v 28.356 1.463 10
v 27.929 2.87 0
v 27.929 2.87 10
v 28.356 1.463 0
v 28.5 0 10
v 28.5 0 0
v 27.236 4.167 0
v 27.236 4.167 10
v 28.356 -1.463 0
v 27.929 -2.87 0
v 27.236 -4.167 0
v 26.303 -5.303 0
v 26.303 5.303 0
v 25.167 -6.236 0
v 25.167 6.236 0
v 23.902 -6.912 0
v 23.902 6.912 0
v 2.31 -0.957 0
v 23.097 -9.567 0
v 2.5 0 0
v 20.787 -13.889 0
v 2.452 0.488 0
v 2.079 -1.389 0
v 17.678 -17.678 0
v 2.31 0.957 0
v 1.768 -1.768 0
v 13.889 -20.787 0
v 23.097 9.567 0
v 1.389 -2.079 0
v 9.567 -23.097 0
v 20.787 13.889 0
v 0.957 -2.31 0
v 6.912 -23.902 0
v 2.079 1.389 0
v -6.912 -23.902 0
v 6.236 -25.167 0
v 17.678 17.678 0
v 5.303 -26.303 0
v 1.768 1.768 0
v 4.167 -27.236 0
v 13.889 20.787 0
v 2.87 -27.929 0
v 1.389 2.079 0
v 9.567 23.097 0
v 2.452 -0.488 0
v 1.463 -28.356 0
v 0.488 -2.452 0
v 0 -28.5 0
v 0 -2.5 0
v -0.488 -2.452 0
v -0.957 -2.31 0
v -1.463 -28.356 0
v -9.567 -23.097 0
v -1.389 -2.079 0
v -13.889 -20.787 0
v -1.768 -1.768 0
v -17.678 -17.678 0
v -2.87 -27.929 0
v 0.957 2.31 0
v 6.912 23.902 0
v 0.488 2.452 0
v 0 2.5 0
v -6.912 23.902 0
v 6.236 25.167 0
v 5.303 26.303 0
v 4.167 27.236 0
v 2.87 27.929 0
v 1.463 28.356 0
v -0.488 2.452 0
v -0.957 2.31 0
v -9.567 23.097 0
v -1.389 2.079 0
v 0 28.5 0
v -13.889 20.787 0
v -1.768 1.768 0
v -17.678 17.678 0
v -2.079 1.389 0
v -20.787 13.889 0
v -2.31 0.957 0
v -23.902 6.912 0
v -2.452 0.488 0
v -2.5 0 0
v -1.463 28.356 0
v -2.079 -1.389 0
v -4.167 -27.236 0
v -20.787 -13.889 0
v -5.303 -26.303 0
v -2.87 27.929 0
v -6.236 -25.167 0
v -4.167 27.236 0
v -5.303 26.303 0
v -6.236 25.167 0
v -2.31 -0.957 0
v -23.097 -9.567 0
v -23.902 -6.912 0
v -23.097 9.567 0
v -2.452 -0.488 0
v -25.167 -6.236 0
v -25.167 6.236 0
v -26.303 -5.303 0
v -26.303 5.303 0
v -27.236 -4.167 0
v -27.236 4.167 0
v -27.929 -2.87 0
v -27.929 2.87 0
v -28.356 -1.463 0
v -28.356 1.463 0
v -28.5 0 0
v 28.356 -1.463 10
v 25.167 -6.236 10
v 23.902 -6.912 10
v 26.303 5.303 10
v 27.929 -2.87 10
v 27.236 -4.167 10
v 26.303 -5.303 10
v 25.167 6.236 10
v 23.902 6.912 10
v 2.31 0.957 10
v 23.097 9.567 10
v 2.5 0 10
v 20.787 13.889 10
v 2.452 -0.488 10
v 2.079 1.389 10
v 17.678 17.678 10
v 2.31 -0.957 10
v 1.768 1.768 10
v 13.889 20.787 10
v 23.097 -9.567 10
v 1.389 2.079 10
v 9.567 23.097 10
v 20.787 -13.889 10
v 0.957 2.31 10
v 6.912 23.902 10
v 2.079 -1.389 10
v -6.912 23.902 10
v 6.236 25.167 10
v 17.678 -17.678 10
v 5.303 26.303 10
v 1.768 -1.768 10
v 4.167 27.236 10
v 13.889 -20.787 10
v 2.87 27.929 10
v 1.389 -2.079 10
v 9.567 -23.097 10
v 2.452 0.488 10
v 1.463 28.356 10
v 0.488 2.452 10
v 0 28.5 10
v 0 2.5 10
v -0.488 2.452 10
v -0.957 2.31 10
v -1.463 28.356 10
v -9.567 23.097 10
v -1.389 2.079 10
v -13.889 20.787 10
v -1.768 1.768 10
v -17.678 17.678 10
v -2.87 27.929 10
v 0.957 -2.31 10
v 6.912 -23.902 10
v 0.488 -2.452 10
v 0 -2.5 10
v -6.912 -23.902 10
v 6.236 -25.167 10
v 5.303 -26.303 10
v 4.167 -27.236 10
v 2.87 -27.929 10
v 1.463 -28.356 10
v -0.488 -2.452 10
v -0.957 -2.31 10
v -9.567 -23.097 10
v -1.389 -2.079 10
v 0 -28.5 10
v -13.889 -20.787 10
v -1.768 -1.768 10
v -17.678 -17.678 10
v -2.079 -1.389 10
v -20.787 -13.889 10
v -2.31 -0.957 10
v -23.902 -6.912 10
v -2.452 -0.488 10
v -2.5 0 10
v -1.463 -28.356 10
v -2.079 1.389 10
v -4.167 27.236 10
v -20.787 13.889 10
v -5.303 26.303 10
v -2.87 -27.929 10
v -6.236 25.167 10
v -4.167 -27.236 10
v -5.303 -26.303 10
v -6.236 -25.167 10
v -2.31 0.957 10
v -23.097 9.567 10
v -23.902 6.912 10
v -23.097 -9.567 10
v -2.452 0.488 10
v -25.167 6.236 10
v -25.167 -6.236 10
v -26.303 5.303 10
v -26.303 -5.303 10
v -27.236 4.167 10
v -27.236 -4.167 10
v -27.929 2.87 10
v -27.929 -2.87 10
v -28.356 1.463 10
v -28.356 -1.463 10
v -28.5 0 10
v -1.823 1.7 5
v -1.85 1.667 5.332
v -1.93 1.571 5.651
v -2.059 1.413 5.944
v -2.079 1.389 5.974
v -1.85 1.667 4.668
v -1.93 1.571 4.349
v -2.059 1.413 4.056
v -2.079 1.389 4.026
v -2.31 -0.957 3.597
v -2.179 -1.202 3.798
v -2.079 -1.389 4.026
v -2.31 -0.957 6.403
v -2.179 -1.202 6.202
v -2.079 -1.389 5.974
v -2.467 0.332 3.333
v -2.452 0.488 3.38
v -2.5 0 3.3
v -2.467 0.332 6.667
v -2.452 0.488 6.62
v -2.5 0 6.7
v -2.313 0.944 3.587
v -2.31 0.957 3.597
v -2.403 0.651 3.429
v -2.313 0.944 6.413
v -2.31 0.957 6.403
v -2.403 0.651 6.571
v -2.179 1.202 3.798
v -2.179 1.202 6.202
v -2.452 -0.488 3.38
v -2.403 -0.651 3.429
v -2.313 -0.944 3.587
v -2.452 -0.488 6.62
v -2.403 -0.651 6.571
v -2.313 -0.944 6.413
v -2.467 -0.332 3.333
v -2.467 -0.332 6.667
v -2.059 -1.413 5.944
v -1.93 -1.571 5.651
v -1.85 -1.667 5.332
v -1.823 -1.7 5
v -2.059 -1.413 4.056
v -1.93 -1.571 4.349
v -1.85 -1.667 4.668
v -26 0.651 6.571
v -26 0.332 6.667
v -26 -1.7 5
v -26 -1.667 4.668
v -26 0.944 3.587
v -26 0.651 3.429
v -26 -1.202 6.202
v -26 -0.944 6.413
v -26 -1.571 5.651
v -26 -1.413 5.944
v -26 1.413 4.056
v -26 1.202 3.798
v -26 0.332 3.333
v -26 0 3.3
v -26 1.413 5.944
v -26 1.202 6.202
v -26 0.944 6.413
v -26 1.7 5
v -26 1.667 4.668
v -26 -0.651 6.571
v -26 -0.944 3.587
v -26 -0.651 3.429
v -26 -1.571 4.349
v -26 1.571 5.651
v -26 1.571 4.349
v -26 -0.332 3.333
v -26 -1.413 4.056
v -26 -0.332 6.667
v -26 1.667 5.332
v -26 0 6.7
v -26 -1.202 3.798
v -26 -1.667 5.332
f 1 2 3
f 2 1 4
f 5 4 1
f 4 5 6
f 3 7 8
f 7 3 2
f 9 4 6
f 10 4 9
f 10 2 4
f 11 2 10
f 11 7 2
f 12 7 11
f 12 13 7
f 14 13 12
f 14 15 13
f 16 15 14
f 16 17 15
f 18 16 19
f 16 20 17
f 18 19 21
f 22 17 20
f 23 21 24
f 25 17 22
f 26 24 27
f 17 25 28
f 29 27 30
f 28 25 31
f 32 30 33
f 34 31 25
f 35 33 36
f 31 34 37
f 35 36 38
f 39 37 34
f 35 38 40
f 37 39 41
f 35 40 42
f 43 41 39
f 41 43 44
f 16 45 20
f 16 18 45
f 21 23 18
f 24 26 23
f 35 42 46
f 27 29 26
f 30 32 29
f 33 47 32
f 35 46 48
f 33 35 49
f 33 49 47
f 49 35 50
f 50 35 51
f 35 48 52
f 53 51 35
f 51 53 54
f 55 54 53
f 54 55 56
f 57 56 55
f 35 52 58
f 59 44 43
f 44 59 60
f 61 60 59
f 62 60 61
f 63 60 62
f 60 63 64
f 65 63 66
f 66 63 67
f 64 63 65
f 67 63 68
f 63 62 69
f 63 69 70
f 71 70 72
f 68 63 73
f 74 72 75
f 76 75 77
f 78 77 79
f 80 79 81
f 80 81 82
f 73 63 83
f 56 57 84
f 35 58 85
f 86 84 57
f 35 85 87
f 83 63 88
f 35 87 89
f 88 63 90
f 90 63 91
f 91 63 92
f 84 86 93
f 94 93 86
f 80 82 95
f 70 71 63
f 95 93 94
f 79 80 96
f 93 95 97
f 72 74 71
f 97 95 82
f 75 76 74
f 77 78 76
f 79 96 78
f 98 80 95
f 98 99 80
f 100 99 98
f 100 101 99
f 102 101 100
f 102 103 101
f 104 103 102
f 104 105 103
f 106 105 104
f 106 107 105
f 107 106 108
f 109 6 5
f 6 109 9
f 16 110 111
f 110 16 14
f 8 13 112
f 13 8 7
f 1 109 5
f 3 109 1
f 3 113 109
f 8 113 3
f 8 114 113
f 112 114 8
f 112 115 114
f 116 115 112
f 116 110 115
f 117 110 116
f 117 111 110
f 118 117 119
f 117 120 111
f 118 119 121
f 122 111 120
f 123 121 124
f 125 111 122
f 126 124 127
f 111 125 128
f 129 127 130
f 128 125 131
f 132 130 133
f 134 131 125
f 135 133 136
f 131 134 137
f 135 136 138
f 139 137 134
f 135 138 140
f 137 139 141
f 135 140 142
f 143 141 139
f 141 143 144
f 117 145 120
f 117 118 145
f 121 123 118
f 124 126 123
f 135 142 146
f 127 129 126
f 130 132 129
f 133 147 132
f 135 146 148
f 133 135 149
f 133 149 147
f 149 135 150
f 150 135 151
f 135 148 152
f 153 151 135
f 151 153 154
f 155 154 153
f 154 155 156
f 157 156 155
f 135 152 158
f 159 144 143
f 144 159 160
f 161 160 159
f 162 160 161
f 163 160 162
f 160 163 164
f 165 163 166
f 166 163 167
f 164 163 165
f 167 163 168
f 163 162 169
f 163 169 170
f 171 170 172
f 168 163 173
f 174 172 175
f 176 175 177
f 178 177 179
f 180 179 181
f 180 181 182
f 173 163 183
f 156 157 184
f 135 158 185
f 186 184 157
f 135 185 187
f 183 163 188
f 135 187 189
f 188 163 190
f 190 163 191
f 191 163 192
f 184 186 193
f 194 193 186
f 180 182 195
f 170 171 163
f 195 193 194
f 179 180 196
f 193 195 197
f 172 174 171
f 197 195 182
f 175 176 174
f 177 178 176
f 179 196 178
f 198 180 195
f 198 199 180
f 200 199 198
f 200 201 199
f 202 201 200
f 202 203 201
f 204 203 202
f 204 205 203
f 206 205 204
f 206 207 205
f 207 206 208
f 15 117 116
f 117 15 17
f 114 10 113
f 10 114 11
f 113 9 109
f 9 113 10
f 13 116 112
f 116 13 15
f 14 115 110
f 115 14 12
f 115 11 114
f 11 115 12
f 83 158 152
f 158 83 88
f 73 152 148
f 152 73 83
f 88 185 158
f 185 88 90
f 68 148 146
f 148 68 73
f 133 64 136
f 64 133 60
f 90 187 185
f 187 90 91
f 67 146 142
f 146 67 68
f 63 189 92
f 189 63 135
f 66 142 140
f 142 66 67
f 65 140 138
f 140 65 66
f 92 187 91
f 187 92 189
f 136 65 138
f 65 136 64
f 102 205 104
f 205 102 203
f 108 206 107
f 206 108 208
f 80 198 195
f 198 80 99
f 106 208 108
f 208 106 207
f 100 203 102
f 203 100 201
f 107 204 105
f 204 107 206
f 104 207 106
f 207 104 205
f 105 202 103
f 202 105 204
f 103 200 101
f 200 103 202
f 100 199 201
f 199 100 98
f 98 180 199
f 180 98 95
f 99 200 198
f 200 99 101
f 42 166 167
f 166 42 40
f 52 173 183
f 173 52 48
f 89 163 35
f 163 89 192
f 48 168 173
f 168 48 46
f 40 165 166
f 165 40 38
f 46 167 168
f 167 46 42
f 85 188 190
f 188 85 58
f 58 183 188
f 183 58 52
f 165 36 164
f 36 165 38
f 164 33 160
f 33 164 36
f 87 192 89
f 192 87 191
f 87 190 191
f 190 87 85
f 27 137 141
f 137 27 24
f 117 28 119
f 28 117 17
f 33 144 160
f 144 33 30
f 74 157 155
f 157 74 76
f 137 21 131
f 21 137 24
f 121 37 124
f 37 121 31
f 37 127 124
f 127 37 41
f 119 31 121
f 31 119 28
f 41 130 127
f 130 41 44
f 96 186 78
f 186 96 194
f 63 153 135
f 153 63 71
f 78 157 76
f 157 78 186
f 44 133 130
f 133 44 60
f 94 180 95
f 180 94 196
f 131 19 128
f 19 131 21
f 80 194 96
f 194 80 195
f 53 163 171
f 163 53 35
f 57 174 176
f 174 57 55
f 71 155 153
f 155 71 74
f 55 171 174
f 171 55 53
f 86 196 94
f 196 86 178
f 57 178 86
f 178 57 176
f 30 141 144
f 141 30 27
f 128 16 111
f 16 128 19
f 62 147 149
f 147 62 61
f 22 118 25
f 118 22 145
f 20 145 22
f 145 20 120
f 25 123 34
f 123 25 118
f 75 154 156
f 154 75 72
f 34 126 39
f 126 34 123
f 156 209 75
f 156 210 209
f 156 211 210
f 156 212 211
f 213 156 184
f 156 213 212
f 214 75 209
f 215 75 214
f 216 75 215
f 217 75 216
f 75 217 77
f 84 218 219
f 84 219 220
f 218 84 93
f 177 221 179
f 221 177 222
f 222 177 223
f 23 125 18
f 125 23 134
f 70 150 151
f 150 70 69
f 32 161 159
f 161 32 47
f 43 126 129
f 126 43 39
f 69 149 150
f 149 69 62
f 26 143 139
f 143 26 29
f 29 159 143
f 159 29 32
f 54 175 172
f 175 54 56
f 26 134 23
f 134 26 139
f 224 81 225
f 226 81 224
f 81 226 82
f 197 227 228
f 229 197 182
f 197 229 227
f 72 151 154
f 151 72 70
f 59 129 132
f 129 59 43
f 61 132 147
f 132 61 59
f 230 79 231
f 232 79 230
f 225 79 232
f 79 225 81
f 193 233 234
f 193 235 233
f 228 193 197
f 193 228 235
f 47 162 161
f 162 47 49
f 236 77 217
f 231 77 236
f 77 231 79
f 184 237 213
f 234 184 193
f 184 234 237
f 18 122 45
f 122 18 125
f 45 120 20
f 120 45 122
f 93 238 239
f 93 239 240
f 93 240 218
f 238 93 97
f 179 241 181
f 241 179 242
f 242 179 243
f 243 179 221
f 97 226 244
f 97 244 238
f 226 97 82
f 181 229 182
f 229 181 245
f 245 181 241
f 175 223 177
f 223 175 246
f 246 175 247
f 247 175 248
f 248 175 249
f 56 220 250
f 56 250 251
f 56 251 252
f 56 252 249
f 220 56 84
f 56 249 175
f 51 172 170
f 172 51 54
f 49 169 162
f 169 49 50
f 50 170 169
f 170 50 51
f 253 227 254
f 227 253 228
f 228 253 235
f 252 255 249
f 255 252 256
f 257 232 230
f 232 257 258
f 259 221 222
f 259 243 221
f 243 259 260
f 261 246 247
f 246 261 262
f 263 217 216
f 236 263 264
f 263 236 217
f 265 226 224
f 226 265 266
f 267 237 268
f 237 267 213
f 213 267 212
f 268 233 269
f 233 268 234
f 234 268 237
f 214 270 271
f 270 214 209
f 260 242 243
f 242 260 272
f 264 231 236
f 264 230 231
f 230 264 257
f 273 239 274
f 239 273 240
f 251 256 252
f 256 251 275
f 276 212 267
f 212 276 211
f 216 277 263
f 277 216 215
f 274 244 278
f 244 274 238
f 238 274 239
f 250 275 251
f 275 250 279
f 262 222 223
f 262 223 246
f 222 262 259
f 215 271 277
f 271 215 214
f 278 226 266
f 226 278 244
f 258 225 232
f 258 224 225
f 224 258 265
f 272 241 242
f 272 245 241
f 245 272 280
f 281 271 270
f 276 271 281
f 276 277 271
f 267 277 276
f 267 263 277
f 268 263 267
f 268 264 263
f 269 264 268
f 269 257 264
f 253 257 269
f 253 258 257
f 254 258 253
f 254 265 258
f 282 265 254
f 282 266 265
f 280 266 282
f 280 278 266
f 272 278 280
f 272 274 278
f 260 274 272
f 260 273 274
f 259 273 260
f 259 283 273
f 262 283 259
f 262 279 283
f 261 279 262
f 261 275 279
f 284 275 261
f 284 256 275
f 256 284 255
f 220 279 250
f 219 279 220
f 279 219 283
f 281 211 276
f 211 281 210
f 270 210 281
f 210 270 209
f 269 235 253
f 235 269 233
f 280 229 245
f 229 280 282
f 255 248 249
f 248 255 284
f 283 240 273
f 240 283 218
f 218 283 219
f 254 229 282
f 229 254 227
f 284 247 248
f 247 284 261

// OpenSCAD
$fn = 32;

// ----------------------------------------------------------------------
// Hand knob: 50 x 50 x 10 mm
// ----------------------------------------------------------------------

// --- parameters (mm) ---
head_d = 50;              // knob diameter
head_h = 10;              // knob height
hole_d = 5;               // shaft bore
set_d = 3.4;              // set screw tap hole
notch_d = 1.62;           // knurl groove diameter
lobes = 4;                // grip lobes

module body() {
  cylinder(h = head_h, d = head_d);
  for (i = [0 : lobes - 1])
    rotate([0, 0, i * 360 / lobes])
      translate([head_d * 0.42, 0, 0])
        cylinder(h = head_h, d = head_d * 0.3);
}

difference() {
  union() {
    body();
  }
  translate([0, 0, -1]) cylinder(h = head_h + 0 + 2, d = hole_d);
  translate([-head_d / 2 - 1, 0, head_h * 0.5]) rotate([0, 90, 0]) cylinder(h = head_d / 2 + 2, d = set_d);
}
